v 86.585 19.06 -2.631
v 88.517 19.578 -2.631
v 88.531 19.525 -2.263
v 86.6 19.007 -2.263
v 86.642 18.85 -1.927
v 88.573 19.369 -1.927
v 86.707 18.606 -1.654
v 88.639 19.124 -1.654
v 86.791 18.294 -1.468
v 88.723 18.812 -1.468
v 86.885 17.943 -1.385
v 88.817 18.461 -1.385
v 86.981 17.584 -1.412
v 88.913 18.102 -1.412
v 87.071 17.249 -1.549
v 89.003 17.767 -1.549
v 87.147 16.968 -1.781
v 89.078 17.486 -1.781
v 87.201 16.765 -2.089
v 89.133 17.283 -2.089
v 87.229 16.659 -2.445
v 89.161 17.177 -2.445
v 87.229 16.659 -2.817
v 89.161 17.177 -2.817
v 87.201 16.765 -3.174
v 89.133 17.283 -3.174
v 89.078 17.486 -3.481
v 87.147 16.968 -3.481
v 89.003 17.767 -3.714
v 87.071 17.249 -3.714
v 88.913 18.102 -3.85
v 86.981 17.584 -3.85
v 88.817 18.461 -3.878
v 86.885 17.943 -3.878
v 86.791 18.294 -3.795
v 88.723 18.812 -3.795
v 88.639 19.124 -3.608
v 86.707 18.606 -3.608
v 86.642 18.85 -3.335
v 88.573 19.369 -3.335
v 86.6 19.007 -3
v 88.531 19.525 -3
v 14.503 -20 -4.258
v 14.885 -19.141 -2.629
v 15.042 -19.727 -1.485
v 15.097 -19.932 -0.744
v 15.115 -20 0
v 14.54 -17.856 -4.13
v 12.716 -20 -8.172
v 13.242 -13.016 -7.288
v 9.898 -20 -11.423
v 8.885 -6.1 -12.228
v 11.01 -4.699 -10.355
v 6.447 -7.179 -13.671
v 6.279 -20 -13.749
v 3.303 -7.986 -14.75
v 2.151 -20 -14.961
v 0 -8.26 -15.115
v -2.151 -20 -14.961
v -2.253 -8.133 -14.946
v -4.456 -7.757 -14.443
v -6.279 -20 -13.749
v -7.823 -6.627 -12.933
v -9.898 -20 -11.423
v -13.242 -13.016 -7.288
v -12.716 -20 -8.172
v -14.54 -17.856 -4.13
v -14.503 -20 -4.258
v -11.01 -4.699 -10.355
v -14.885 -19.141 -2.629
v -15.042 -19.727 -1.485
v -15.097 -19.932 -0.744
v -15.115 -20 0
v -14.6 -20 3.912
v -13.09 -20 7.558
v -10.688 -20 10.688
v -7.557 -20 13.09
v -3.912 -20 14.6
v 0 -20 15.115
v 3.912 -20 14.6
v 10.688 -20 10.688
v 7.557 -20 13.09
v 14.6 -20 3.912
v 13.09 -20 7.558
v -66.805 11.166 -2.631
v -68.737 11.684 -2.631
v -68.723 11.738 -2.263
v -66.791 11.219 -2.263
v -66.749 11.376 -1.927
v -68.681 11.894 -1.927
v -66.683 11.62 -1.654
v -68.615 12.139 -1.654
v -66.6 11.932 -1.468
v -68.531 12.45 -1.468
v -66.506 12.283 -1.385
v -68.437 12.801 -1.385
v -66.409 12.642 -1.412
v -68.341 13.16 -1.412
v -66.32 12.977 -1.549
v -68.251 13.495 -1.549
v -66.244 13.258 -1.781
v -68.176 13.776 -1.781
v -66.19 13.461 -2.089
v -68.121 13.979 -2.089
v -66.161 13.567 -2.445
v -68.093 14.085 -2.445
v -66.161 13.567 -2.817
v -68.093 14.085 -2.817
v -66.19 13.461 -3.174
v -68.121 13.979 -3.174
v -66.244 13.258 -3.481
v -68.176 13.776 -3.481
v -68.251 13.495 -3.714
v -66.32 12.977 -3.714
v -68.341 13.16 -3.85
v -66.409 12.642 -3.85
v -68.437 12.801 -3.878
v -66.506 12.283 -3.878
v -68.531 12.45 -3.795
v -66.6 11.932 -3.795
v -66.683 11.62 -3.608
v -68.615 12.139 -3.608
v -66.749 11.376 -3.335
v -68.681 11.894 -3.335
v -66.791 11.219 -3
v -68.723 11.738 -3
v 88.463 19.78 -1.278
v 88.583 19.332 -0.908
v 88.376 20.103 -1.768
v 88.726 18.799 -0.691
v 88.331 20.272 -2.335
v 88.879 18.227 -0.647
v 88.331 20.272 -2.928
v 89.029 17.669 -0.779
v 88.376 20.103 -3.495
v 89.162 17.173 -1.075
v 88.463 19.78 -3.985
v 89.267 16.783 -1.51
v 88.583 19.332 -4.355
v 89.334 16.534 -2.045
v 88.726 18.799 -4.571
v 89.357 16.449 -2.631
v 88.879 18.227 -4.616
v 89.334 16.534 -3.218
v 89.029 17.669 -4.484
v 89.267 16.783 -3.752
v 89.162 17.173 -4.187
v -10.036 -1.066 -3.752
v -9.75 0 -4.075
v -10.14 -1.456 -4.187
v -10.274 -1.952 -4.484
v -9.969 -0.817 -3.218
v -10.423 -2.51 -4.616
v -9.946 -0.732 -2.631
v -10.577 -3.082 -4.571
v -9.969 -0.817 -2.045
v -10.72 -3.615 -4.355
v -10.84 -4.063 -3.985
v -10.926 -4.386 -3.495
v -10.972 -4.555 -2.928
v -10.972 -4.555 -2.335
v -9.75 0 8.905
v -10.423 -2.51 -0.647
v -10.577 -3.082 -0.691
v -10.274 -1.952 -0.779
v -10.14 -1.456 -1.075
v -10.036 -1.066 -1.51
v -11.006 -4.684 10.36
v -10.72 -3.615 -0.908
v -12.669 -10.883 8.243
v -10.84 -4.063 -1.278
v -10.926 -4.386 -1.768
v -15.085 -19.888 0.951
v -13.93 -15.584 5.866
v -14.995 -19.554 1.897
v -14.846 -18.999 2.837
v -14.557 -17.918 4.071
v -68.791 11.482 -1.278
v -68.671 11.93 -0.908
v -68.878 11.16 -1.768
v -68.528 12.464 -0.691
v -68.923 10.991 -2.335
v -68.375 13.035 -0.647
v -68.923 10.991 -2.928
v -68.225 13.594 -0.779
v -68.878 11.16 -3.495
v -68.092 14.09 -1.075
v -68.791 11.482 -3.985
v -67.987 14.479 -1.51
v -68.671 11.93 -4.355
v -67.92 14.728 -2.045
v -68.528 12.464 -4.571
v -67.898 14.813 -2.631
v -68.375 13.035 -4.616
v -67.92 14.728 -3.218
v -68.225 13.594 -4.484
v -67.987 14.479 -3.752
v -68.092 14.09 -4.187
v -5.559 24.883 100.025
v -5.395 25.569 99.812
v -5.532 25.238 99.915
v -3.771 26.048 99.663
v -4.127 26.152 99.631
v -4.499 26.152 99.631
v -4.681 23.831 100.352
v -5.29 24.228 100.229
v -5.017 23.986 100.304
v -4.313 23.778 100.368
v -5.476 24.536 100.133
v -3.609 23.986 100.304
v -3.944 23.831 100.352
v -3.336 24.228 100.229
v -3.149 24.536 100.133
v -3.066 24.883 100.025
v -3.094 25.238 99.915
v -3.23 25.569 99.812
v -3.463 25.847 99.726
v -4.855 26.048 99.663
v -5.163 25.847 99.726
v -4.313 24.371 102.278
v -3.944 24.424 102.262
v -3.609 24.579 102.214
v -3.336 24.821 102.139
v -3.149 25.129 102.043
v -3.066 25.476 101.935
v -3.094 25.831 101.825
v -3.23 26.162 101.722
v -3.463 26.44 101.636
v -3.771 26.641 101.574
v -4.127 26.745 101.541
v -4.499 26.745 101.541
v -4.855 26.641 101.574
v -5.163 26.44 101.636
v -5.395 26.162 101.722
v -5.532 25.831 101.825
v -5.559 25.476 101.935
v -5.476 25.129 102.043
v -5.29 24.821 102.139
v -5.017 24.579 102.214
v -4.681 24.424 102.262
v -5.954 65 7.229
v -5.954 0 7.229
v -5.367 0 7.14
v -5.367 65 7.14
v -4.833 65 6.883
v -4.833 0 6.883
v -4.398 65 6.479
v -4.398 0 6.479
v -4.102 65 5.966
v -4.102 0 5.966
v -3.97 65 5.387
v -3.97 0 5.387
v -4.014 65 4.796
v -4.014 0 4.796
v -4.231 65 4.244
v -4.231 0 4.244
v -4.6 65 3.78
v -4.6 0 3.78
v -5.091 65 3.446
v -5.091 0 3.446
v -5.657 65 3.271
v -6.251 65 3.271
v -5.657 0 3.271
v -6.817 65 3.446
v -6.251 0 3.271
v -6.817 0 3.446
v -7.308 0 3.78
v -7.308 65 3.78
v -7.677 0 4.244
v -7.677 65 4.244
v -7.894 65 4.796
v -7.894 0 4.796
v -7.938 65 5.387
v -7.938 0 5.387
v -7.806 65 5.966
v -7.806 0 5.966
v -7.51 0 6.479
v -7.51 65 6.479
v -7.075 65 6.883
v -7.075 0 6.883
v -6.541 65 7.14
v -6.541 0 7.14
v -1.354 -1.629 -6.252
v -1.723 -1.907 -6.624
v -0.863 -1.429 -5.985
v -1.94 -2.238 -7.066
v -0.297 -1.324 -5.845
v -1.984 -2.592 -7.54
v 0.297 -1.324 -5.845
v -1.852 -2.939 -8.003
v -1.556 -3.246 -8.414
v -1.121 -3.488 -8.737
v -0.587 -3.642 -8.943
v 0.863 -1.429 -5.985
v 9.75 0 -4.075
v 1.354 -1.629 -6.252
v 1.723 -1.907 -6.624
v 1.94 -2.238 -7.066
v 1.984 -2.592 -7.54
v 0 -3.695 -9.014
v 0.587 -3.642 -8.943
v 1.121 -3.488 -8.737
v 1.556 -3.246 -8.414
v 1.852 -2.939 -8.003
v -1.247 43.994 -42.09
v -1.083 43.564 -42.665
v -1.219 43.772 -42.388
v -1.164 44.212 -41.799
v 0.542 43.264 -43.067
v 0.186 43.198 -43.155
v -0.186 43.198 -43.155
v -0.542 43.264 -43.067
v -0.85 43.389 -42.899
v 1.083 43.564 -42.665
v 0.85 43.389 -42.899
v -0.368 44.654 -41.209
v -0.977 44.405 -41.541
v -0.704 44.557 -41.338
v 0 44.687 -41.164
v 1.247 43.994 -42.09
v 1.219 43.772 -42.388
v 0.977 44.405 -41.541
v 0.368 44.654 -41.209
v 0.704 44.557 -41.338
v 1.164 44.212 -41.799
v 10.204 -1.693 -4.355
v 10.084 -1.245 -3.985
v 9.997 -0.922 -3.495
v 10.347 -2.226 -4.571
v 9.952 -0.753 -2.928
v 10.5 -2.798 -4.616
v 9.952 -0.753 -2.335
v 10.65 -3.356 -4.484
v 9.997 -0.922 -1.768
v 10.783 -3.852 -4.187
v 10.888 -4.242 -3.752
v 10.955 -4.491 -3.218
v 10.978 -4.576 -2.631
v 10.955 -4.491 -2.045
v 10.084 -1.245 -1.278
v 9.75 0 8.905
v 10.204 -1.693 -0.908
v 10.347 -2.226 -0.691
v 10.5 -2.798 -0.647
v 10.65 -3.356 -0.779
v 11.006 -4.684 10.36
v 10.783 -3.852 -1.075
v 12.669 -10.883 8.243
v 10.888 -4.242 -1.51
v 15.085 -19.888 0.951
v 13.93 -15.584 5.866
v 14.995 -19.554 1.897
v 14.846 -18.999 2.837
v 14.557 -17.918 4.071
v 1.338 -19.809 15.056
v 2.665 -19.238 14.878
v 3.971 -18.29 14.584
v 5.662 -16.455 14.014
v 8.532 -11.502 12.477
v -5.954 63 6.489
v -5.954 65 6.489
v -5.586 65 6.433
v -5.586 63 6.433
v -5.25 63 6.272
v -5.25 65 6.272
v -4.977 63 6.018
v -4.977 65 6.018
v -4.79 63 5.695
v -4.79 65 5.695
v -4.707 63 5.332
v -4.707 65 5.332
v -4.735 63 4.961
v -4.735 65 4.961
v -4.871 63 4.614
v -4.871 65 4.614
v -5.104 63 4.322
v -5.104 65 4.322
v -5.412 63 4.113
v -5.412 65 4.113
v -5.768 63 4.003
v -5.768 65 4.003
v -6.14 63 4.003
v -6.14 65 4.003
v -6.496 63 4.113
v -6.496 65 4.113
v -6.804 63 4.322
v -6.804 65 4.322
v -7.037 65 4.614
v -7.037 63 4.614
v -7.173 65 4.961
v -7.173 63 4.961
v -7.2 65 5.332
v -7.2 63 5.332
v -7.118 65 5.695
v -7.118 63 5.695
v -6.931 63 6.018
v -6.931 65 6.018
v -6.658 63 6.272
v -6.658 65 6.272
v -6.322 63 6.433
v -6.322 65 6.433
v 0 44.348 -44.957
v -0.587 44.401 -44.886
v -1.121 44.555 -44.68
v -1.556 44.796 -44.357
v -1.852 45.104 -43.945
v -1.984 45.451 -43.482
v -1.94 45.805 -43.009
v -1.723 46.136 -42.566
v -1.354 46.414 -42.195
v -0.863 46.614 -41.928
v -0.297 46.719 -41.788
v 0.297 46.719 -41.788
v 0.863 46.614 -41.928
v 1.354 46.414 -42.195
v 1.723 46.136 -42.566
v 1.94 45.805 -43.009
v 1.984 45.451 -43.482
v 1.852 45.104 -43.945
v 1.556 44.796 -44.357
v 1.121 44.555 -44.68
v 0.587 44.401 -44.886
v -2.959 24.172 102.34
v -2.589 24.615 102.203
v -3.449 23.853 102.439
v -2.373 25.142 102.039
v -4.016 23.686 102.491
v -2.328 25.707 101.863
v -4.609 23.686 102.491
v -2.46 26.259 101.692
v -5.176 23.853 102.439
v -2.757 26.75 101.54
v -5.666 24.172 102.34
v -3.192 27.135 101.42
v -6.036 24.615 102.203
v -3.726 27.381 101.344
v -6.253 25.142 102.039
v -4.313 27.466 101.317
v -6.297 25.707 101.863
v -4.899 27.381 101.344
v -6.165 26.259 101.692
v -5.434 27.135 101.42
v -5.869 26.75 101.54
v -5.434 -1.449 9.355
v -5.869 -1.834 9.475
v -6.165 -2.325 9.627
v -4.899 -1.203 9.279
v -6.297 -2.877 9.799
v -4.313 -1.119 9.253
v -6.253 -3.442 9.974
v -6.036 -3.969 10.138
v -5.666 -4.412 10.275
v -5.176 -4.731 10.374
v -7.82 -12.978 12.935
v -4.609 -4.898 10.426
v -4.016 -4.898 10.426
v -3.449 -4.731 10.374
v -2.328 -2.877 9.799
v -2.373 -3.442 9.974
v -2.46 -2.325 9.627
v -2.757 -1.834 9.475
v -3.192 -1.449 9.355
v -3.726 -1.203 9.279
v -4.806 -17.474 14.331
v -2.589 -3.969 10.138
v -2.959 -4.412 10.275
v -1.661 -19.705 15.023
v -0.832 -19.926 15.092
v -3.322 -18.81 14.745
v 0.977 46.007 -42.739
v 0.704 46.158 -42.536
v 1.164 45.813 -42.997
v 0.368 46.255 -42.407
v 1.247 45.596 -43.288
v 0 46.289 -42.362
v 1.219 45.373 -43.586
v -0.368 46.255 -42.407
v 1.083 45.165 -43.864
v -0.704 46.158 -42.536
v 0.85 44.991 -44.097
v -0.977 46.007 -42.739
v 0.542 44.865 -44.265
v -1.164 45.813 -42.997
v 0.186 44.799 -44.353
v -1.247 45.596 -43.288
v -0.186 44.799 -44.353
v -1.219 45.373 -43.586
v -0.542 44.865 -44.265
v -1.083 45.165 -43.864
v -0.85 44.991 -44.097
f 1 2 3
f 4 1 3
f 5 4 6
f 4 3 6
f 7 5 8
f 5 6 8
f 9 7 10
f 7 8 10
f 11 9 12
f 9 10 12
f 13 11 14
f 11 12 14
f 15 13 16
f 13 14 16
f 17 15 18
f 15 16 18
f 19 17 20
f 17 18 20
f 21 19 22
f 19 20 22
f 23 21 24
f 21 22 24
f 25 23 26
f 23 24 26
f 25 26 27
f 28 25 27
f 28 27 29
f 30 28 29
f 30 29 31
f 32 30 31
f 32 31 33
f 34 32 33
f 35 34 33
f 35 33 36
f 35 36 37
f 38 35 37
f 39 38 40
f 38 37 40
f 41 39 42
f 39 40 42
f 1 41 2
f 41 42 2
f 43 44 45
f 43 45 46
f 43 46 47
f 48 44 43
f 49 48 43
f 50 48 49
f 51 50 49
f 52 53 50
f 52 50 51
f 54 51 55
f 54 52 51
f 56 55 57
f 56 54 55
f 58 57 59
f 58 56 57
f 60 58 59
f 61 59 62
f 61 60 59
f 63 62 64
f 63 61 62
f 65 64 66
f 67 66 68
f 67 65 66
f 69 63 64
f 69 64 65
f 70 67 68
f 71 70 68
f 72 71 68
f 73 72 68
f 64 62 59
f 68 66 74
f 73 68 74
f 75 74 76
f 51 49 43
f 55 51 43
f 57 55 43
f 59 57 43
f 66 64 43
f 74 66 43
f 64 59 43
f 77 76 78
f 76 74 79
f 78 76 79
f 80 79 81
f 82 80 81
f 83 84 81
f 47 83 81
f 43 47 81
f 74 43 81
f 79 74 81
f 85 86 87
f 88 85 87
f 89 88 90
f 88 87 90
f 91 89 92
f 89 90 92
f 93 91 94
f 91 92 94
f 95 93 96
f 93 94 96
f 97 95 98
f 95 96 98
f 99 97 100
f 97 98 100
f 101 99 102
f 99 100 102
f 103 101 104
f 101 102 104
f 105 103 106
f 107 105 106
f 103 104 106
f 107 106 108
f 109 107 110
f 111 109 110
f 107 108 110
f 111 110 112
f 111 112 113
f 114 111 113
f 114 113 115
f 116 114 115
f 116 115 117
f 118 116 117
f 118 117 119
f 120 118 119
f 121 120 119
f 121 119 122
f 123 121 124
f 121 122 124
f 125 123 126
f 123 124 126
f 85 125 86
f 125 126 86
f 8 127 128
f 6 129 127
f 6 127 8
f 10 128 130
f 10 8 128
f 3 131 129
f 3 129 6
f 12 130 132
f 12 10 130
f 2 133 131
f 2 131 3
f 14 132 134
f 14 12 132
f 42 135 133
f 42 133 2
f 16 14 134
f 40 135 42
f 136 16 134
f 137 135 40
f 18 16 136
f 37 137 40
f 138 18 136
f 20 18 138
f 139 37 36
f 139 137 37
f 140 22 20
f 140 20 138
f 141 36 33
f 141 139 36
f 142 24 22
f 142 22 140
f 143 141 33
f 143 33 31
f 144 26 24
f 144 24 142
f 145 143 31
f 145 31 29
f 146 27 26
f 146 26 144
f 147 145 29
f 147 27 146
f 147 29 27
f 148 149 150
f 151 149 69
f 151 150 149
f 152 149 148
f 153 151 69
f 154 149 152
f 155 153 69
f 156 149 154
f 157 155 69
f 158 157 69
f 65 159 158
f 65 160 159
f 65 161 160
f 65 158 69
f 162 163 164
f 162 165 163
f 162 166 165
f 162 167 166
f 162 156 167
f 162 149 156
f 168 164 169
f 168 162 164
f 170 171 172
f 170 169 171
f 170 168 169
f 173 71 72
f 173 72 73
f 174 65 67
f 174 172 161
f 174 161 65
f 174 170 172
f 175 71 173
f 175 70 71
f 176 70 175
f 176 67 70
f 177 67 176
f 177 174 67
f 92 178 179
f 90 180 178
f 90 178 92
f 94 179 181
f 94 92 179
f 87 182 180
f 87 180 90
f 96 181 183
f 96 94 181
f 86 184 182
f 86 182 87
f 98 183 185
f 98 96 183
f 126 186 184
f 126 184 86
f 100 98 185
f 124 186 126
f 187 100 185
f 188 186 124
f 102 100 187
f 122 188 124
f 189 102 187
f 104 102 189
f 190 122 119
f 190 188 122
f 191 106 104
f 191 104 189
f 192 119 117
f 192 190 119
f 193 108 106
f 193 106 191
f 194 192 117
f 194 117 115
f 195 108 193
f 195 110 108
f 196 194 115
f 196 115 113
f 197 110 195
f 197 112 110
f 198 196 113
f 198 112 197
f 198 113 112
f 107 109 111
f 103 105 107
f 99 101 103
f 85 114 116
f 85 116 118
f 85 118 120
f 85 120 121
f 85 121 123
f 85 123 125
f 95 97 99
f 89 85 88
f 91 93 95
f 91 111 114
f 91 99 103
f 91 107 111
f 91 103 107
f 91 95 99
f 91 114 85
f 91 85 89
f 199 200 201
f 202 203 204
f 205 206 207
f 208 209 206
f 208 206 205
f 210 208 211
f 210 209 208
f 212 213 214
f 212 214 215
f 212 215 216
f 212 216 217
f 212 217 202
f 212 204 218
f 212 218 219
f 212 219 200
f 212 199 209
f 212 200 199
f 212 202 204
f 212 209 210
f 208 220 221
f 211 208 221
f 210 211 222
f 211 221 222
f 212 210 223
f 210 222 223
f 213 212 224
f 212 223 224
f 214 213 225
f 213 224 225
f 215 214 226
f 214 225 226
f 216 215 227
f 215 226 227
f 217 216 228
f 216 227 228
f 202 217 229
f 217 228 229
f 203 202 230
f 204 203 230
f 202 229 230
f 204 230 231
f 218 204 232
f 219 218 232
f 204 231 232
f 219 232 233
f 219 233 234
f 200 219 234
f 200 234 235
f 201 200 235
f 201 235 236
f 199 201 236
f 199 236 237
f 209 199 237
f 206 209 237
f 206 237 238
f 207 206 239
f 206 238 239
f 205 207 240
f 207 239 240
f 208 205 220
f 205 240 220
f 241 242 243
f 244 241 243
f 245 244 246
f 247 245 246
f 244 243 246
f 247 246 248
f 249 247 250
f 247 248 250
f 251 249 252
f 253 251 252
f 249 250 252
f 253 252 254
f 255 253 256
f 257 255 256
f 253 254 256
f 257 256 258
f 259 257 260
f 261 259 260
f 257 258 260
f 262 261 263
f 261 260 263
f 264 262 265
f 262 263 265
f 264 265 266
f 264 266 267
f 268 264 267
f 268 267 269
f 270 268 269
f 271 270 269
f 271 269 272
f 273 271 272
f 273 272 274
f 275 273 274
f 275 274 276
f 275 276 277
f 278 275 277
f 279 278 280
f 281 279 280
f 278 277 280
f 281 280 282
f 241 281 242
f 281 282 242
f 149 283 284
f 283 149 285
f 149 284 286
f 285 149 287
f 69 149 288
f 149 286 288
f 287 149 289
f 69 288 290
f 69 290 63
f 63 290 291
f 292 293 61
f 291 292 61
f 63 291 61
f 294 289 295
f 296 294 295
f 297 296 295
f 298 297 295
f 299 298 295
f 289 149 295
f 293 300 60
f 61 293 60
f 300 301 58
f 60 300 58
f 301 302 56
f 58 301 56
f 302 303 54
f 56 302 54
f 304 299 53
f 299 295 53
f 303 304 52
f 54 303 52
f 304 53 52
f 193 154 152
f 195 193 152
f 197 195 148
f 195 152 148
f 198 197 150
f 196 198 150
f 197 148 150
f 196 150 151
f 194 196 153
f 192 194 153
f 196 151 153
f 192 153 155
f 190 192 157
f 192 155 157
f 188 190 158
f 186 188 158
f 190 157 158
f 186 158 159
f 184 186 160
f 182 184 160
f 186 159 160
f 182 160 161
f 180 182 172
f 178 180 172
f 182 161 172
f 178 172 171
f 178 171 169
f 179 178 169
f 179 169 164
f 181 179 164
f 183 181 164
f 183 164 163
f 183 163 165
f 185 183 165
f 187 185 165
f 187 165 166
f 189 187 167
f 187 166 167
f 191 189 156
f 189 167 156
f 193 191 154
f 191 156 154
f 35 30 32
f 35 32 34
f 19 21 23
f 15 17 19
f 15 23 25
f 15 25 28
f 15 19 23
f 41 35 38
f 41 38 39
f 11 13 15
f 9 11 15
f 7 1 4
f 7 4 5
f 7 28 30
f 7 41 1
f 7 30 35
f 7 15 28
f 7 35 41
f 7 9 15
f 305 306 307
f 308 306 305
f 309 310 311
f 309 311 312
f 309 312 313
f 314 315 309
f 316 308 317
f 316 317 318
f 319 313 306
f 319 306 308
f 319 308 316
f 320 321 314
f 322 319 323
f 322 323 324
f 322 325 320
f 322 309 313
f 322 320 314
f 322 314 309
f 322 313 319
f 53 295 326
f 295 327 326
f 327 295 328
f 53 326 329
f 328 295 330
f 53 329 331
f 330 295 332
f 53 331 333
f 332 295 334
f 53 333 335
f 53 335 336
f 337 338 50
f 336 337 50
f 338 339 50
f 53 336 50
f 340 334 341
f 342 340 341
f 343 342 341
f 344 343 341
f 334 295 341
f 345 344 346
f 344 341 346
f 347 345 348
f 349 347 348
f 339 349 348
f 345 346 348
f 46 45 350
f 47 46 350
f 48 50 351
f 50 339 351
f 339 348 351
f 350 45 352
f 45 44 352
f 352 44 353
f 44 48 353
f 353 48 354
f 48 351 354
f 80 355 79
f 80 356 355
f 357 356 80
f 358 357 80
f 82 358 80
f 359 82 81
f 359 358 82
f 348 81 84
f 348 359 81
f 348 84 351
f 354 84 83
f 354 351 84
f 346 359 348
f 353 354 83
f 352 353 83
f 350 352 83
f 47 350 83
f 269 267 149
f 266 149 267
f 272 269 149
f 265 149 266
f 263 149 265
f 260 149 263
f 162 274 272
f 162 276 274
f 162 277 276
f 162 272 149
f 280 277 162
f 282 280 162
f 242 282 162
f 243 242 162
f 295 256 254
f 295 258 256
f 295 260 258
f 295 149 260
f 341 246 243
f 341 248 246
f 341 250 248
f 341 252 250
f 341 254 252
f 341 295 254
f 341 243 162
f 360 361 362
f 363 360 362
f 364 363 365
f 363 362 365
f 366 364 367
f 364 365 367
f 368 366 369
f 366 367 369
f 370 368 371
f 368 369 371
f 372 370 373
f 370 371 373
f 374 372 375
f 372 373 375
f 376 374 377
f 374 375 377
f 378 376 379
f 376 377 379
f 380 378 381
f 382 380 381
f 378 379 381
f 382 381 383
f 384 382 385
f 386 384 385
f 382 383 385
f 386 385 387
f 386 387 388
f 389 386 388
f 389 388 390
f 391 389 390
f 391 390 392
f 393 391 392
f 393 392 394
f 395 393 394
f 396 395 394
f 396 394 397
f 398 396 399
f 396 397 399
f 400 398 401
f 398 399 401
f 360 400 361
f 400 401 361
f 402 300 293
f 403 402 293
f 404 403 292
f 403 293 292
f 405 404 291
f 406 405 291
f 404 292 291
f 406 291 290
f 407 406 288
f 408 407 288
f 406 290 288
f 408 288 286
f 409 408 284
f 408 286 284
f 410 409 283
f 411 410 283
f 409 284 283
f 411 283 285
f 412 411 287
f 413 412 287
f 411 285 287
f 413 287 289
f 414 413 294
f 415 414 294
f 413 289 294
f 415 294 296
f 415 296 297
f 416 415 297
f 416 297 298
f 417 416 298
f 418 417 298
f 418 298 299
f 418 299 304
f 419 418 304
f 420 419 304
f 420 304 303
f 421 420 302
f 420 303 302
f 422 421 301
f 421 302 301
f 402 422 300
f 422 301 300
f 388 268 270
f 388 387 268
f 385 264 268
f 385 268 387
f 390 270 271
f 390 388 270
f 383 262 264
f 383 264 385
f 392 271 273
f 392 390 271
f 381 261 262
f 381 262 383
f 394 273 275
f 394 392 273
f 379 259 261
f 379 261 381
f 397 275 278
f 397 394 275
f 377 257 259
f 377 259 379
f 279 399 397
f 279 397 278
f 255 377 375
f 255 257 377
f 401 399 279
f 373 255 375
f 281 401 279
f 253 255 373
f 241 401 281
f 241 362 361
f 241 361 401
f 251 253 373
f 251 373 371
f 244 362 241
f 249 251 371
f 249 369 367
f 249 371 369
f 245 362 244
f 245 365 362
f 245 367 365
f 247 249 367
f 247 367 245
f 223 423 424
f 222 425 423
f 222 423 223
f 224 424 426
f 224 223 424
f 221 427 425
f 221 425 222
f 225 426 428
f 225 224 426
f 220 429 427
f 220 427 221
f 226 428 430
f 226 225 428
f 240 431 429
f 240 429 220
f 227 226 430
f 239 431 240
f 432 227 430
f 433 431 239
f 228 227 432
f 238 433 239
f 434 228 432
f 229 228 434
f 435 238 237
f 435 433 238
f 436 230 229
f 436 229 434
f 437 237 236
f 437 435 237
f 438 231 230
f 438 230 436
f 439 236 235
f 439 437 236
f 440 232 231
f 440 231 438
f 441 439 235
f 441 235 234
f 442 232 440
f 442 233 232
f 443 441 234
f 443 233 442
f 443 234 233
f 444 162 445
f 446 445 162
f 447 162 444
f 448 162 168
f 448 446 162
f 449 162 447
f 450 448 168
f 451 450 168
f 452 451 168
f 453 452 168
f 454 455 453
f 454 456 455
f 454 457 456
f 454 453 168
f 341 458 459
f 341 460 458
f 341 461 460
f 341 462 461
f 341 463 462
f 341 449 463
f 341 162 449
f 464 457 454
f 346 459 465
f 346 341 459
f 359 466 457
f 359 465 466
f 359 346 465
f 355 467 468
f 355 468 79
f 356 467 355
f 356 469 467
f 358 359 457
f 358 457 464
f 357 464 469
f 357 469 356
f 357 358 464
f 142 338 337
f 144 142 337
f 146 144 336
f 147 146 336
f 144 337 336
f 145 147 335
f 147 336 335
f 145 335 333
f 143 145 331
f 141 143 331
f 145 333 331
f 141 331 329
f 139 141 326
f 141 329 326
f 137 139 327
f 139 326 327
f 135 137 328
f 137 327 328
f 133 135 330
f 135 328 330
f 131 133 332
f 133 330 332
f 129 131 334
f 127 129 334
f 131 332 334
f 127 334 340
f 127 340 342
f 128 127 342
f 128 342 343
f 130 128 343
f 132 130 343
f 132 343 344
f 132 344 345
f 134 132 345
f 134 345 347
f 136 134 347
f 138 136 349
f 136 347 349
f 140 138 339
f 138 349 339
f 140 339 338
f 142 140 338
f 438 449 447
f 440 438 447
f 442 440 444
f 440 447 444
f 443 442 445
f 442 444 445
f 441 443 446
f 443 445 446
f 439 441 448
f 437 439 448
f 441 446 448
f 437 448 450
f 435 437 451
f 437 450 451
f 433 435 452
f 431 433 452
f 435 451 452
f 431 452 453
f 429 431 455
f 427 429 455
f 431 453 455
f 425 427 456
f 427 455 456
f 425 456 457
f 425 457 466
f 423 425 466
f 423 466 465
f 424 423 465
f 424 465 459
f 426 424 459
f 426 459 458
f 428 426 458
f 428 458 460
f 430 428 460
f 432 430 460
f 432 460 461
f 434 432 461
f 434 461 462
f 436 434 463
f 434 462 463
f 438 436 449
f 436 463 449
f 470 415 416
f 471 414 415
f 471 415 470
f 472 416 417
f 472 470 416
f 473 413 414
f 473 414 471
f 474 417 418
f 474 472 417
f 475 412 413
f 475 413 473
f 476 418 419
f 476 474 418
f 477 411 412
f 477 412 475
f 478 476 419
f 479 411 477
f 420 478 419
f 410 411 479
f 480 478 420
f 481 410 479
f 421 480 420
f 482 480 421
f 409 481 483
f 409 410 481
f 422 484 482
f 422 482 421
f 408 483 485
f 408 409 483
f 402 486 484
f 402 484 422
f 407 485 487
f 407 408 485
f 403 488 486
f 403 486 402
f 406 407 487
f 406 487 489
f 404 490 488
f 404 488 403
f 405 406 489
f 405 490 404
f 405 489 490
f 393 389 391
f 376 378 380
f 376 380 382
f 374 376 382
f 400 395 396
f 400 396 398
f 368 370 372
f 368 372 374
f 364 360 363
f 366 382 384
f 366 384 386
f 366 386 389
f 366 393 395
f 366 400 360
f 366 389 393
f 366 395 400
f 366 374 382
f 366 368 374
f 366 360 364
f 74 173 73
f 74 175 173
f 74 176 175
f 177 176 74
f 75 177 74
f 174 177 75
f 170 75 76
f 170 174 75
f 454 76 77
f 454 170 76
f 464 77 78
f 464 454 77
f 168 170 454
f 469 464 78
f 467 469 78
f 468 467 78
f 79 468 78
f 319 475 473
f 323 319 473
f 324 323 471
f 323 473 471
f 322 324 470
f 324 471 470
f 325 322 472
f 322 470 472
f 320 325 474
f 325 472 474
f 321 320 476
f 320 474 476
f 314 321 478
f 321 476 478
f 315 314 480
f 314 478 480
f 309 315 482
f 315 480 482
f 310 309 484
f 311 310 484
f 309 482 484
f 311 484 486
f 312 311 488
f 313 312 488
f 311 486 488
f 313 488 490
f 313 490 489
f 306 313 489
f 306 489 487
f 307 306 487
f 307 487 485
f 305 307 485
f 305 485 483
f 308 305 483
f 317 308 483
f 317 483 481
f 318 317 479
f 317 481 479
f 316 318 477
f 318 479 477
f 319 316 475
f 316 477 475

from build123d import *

# Parameters (mm, degrees)
SKETCH1_R           = 15.115
BOSS_EXTRUDE1_DEPTH = 20
CUT_EXTRUDE1_DEPTH  = 40.272332818
CUT_EXTRUDE3_DEPTH  = 40.272332818
SKETCH8_R           = 1.99
BOSS_EXTRUDE2_DEPTH = 65
SKETCH9_R           = 1.25
CUT_EXTRUDE4_DEPTH  = 2
SKETCH11_R          = 1.99
BOSS_EXTRUDE3_DEPTH = 96.4
SKETCH12_R          = 1.25
CUT_EXTRUDE5_DEPTH  = 2
SKETCH13_R          = 1.99
BOSS_EXTRUDE4_DEPTH = 81.15
SKETCH14_R          = 1.25
CUT_EXTRUDE6_DEPTH  = 2
SKETCH15_R          = 1.99
BOSS_EXTRUDE5_DEPTH = 60
SKETCH16_R          = 1.25
CUT_EXTRUDE7_DEPTH  = 2
SKETCH17_R          = 1.99
BOSS_EXTRUDE6_DEPTH = 60
SKETCH18_R          = 1.25
CUT_EXTRUDE8_DEPTH  = 2


with BuildPart() as part:
    # Sketch1 → Boss-Extrude1 (new body)
    with BuildSketch(Plane(origin=(0, 0, 0), x_dir=(1, 0, 0), z_dir=(0, 1, 0))):
        with Locations(Location((0, 0, 0), (0, 0, 270))):
            Circle(SKETCH1_R)
    extrude(amount=-BOSS_EXTRUDE1_DEPTH)

    # Sketch3 → Cut-Extrude1 (cut, through all)
    with BuildSketch(Plane(origin=(15.115, 0, 0), x_dir=(0, 0, -1), z_dir=(1, 0, 0))):
        Polygon((-8.905426603, 0), (-15.115, -20), (-15.115, 0), align=None)
        Polygon((4.07457383, 0), (15.115, -8.259757639), (15.115, 0), align=None)
    extrude(amount=-CUT_EXTRUDE1_DEPTH, mode=Mode.SUBTRACT)

    # Sketch7 → Cut-Extrude3 (cut, through all)
    with BuildSketch(Plane.XY.offset(15.115)):
        Polygon((15.115, 0), (9.75, 0), (15.115, -20), align=None)
        Polygon((-15.115, -20), (-15.115, 0), (-9.75, 0), align=None)
    extrude(amount=-CUT_EXTRUDE3_DEPTH, mode=Mode.SUBTRACT)

    # Sketch8 → Boss-Extrude2 (add)
    with BuildSketch(Plane(origin=(0, 0, 0), x_dir=(1, 0, 0), z_dir=(0, 1, 0))):
        with Locations(Location((-5.953992214, -5.238739903, 0), (0, 0, 270))):
            Circle(SKETCH8_R)
    extrude(amount=BOSS_EXTRUDE2_DEPTH)

    # Sketch9 → Cut-Extrude4 (cut)
    with BuildSketch(Plane(origin=(0, 65, 0), x_dir=(1, 0, 0), z_dir=(0, 1, 0))):
        with Locations(Location((-5.953992214, -5.238739903, 0), (0, 0, 270))):
            Circle(SKETCH9_R)
    extrude(amount=-CUT_EXTRUDE4_DEPTH, mode=Mode.SUBTRACT)

    # Sketch11 → Boss-Extrude3 (add)
    with BuildSketch(Plane(origin=(0, 2.521846553, 8.12244704), x_dir=(1, 0, 0), z_dir=(0, 0.296515806173068, 0.9550279455018769))):
        with Locations(Location((-4.312884214, -5.801881574, 0), (0, 0, 90))):
            Circle(SKETCH11_R)
    extrude(amount=BOSS_EXTRUDE3_DEPTH)

    # Sketch12 → Cut-Extrude5 (cut)
    with BuildSketch(Plane(origin=(0, 31.105970268, 100.187140986), x_dir=(1, 0, 0), z_dir=(0, 0.2965158061730681, 0.9550279455018768))):
        with Locations(Location((-4.312884214, -5.801881574, 0), (0, 0, 270))):
            Circle(SKETCH12_R)
    extrude(amount=-CUT_EXTRUDE5_DEPTH, mode=Mode.SUBTRACT)

    # Sketch13 → Boss-Extrude4 (add)
    with BuildSketch(Plane(origin=(9.095505077, 2.439869237, 0), x_dir=(0, 0, -1), z_dir=(0.9658531542677156, 0.25909010863231474, 0))):
        with Locations(Location((2.631146058, -5.274029077, 0), (0, 0, 270))):
            Circle(SKETCH13_R)
    extrude(amount=BOSS_EXTRUDE4_DEPTH)

    # Sketch14 → Cut-Extrude6 (cut)
    with BuildSketch(Plane(origin=(87.474488546, 23.465031552, 0), x_dir=(0, 0, -1), z_dir=(0.9658531542677156, 0.2590901086323148, 0))):
        with Locations(Location((2.631146058, -5.274029077, 0), (0, 0, 90))):
            Circle(SKETCH14_R)
    extrude(amount=-CUT_EXTRUDE6_DEPTH, mode=Mode.SUBTRACT)

    # Sketch15 → Boss-Extrude5 (add)
    with BuildSketch(Plane(origin=(-9.095505077, 2.439869237, 0), x_dir=(0, 0, 1), z_dir=(-0.9658531542677156, 0.25909010863231474, 0))):
        with Locations(Location((-2.63114606, -5.274029079, 0), (0, 0, 90))):
            Circle(SKETCH15_R)
    extrude(amount=BOSS_EXTRUDE5_DEPTH)

    # Sketch16 → Cut-Extrude7 (cut)
    with BuildSketch(Plane(origin=(-67.046694333, 17.985275755, 0), x_dir=(0, 0, 1), z_dir=(-0.9658531542677156, 0.2590901086323148, 0))):
        with Locations(Location((-2.63114606, -5.274029079, 0), (0, 0, 270))):
            Circle(SKETCH16_R)
    extrude(amount=-CUT_EXTRUDE7_DEPTH, mode=Mode.SUBTRACT)

    # Sketch17 → Boss-Extrude6 (add)
    with BuildSketch(Plane(origin=(0, 1.95442878, -1.462181603), x_dir=(1, 0, 0), z_dir=(0, 0.8007152420957264, -0.5990451577932857))):
        with Locations(Location((0, 7.441155509, 0), (0, 0, 90))):
            Circle(SKETCH17_R)
    extrude(amount=BOSS_EXTRUDE6_DEPTH)

    # Sketch18 → Cut-Extrude8 (cut)
    with BuildSketch(Plane(origin=(0, 49.997343305, -37.404891071), x_dir=(1, 0, 0), z_dir=(0, 0.8007152420957262, -0.5990451577932858))):
        with Locations(Location((0, 7.441155509, 0), (0, 0, 270))):
            Circle(SKETCH18_R)
    extrude(amount=-CUT_EXTRUDE8_DEPTH, mode=Mode.SUBTRACT)


solid = part.part
